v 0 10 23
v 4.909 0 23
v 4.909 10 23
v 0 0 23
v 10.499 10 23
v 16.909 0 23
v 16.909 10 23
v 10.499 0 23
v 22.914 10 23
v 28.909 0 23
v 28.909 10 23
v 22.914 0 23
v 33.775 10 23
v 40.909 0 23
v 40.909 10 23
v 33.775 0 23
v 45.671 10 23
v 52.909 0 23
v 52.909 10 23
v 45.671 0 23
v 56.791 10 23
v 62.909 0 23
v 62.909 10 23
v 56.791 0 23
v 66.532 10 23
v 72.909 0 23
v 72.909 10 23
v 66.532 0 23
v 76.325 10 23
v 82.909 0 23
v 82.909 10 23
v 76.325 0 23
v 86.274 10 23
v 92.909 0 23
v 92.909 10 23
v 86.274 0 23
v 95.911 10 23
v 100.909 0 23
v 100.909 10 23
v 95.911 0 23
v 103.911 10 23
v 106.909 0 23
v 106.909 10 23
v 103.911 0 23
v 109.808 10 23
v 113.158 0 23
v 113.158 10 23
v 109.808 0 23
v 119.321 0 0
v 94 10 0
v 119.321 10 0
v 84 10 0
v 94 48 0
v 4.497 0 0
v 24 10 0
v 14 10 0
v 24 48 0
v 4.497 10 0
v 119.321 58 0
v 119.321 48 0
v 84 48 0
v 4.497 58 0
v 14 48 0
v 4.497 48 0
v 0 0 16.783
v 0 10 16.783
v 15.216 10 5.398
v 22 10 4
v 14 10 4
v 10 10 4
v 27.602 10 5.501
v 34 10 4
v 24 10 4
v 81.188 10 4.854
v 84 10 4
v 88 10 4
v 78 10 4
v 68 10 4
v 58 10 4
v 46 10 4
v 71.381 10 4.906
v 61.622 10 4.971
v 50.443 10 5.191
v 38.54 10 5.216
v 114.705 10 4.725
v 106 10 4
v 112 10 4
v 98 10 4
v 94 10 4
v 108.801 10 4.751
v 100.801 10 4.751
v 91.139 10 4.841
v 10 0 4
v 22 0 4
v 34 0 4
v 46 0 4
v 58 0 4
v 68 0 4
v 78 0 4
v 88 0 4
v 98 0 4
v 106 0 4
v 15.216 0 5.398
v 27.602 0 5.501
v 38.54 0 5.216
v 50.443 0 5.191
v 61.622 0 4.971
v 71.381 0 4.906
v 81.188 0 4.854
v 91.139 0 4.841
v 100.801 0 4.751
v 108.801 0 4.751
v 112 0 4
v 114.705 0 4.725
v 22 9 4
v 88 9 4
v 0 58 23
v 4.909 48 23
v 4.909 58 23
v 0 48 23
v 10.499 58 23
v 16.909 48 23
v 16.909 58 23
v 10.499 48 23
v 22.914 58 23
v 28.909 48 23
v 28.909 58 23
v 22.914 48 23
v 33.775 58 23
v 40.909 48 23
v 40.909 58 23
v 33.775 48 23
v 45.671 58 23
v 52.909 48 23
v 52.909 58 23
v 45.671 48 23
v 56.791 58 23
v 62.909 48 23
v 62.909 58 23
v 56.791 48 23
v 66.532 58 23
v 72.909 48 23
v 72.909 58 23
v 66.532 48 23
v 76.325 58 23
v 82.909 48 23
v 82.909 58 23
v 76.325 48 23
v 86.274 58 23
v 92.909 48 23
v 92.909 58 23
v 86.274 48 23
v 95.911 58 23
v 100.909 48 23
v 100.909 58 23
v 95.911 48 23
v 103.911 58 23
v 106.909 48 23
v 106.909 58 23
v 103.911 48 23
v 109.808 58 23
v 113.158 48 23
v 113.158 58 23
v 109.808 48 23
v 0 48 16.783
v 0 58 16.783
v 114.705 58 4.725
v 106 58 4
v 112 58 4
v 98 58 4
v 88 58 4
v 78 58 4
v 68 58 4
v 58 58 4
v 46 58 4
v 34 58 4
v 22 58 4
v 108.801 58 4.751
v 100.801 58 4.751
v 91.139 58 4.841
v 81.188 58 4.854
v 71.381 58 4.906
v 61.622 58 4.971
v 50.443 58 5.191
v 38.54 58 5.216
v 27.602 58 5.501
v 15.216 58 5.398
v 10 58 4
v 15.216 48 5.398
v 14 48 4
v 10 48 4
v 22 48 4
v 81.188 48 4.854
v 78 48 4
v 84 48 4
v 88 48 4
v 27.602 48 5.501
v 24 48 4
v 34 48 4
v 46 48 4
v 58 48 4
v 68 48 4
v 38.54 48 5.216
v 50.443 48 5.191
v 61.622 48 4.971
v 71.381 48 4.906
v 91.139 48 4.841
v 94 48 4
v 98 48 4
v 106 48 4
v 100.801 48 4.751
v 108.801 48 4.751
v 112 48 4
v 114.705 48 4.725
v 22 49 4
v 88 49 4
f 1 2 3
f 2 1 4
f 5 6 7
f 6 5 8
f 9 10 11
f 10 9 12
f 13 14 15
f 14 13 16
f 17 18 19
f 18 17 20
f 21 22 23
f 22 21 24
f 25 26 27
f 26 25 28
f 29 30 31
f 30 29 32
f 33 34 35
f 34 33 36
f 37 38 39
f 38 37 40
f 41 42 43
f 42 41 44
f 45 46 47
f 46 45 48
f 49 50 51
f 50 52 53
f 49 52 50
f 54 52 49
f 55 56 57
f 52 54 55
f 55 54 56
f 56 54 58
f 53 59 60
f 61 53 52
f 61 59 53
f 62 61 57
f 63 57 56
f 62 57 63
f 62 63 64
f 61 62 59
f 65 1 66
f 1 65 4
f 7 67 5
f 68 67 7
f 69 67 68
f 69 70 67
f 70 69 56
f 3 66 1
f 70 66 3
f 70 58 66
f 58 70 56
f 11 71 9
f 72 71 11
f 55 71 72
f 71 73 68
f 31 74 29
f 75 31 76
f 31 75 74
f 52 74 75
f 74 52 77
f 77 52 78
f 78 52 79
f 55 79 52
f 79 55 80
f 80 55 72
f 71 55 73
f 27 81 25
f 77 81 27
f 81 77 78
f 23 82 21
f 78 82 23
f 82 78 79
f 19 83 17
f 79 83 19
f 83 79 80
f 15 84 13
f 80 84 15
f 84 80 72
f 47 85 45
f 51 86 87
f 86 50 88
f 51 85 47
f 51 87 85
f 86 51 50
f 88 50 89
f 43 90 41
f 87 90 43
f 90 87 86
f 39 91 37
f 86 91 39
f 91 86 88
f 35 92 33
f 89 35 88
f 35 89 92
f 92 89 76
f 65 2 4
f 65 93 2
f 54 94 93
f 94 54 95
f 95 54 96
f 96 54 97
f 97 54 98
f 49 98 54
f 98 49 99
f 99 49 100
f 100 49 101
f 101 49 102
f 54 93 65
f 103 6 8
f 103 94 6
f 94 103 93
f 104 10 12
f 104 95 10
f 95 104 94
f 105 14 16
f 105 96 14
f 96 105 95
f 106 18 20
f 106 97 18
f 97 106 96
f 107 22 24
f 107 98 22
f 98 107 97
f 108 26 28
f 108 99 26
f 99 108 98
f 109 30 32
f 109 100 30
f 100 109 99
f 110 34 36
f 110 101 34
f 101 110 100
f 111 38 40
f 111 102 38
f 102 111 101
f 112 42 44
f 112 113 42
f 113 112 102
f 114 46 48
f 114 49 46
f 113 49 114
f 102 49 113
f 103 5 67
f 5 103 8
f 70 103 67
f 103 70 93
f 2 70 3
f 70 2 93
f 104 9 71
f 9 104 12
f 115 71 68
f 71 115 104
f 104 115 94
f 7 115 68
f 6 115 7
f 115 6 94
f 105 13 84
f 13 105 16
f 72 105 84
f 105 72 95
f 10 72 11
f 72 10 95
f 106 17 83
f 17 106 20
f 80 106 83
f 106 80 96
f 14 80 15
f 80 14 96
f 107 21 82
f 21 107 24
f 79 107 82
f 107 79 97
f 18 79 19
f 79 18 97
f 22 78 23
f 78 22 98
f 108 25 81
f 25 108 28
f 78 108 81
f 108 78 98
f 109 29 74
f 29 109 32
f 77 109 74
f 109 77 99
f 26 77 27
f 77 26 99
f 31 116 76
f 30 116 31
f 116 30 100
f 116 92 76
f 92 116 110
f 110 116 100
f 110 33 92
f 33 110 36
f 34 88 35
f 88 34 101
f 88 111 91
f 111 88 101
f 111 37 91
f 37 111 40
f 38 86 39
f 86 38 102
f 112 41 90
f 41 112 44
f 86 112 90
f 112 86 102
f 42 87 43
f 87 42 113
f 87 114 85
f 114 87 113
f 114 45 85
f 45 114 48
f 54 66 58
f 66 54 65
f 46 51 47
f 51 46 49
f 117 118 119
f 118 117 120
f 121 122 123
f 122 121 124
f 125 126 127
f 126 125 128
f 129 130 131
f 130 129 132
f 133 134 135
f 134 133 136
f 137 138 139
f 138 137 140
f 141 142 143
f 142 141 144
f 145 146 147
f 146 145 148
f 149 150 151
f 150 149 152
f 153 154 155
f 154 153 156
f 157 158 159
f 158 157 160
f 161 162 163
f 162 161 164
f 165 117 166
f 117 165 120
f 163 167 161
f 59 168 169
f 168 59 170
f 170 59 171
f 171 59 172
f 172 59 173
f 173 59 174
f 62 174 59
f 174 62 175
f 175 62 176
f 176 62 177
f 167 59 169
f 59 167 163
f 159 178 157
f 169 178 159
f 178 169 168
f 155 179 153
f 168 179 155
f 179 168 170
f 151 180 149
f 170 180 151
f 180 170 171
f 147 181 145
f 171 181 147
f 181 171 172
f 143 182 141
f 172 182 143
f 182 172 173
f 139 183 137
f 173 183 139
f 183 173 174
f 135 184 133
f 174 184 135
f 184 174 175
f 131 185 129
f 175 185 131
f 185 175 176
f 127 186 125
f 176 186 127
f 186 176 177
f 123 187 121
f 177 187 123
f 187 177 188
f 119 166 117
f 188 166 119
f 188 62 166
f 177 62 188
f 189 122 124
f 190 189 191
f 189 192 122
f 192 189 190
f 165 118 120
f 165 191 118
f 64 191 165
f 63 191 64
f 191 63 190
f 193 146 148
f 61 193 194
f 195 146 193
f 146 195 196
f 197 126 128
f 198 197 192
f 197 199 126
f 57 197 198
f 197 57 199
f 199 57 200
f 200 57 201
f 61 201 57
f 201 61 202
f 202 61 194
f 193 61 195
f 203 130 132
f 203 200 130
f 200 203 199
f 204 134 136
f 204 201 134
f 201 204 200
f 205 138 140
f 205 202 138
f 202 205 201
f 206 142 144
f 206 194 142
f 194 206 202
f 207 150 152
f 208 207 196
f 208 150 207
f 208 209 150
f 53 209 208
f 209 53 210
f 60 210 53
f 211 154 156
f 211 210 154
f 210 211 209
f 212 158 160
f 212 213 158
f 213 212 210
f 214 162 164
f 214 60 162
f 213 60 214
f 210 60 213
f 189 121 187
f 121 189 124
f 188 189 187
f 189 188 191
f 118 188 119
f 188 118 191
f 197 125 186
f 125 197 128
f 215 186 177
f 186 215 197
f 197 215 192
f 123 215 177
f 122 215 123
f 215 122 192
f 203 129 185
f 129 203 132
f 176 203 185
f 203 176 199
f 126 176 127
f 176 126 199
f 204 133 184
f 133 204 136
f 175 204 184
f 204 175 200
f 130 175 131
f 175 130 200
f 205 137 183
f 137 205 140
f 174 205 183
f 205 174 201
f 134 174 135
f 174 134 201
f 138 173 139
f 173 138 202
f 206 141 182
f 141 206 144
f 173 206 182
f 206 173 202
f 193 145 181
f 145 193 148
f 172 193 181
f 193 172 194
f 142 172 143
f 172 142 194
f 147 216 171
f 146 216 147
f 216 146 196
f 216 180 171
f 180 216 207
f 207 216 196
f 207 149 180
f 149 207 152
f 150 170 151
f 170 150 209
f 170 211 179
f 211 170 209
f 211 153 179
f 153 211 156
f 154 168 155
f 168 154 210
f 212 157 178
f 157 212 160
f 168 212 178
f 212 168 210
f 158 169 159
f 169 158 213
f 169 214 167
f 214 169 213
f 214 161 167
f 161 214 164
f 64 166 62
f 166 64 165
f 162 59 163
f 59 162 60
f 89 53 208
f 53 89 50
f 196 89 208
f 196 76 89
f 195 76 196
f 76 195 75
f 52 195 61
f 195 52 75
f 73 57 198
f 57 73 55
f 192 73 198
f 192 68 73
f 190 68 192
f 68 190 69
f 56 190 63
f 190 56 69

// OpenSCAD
module wrench_org_in_longs(){
	difference()
	{
		cube([107,10,23]);
		
		translate([10,-1,4]) rotate([0,-15,0]) cube([6.5,12,20]);
		translate([22,-1,4]) rotate([0,-15,0]) cube([6.2,12,20]);
		translate([34,-1,4]) rotate([0,-15,0]) cube([5.2,12,20]);
		translate([46,-1,4]) rotate([0,-15,0]) cube([5.2,12,20]);
		translate([58,-1,4]) rotate([0,-15,0]) cube([5.1,12,20]);
		translate([68,-1,4]) rotate([0,-15,0]) cube([4.2,12,20]);
		translate([78,-1,4]) rotate([0,-15,0]) cube([3.2,12,20]);
		translate([88,-1,4]) rotate([0,-15,0]) cube([2.95,12,20]);
		translate([98,-1,4]) rotate([0,-15,0]) cube([2.75,12,20]);
		
		translate([2,-1,-10]) rotate([0,-15,0]) cube([5,12,50]);
		translate([110,-1,-10]) rotate([0,-15,0]) cube([7,12,50]);
	}
}

module wrench_org_in_shorts(){
	difference()
	{
		cube([88,10,23]);
		
		translate([10,-1,4]) rotate([0,-15,0]) cube([6.6,12,20]);
		translate([22,-1,4]) rotate([0,-15,0]) cube([5.1,12,20]);
		translate([34,-1,4]) rotate([0,-15,0]) cube([5.1,12,20]);
		translate([46,-1,4]) rotate([0,-15,0]) cube([5.4,12,20]);
		translate([58,-1,4]) rotate([0,-15,0]) cube([4.3,12,20]);
		translate([68,-1,4]) rotate([0,-15,0]) cube([3.8,12,20]);
		translate([78,-1,4]) rotate([0,-15,0]) cube([3,12,20]);


		translate([2,-1,-10]) rotate([0,-15,0]) cube([5,12,50]);
		translate([90,-1,-10]) rotate([0,-15,0]) cube([7,12,50]);
	}
}

module wrench_org_mm_longs(){
	difference()
	{
		cube([120,10,23]);
		
		translate([10,-1,4]) rotate([0,-15,0]) cube([5.4,12,20]);
		translate([22,-1,4]) rotate([0,-15,0]) cube([5.8,12,20]);
		translate([34,-1,4]) rotate([0,-15,0]) cube([4.7,12,20]);
		translate([46,-1,4]) rotate([0,-15,0]) cube([4.6,12,20]);
		translate([58,-1,4]) rotate([0,-15,0]) cube([3.75,12,20]);
		translate([68,-1,4]) rotate([0,-15,0]) cube([3.5,12,20]);
		translate([78,-1,4]) rotate([0,-15,0]) cube([3.3,12,20]);
		translate([88,-1,4]) rotate([0,-15,0]) cube([3.25,12,20]);
		translate([98,-1,4]) rotate([0,-15,0]) cube([2.9,12,20]);
		translate([106,-1,4]) rotate([0,-15,0]) cube([2.9,12,20]);
		translate([112,-1,4]) rotate([0,-15,0]) cube([2.8,12,20]);

		translate([2,-1,-10]) rotate([0,-15,0]) cube([5,12,50]);
		translate([122,-1,-10]) rotate([0,-15,0]) cube([7,12,50]);
	}
}

module wrench_org_mm_shorts(){
	difference()
	{
		cube([88,10,23]);
		
		translate([10,-1,4]) rotate([0,-15,0]) cube([5.1,12,20]);
		translate([22,-1,4]) rotate([0,-15,0]) cube([4.5,12,20]);
		translate([34,-1,4]) rotate([0,-15,0]) cube([4.5,12,20]);
		translate([46,-1,4]) rotate([0,-15,0]) cube([4.4,12,20]);
		translate([58,-1,4]) rotate([0,-15,0]) cube([4.25,12,20]);
		translate([68,-1,4]) rotate([0,-15,0]) cube([3.7,12,20]);
		translate([78,-1,4]) rotate([0,-15,0]) cube([3.7,12,20]);


		translate([2,-1,-10]) rotate([0,-15,0]) cube([5,12,50]);
		translate([90,-1,-10]) rotate([0,-15,0]) cube([7,12,50]);
	}
}
//wrench_org_in_shorts();
//translate([64,9,0]) cube([10,20,4]);
//translate([14,9,0]) cube([10,20,4]);
//translate([0,28,0]) wrench_org_in_shorts();

//wrench_org_in_longs();
//translate([84,9,0]) cube([10,40,4]);
//translate([14,9,0]) cube([10,40,4]);
//translate([0,48,0]) wrench_org_in_longs();

//wrench_org_mm_shorts();
//translate([64,9,0]) cube([10,20,4]);
//translate([14,9,0]) cube([10,20,4]);
//translate([0,28,0]) wrench_org_mm_shorts();

wrench_org_mm_longs();
translate([84,9,0]) cube([10,40,4]);
translate([14,9,0]) cube([10,40,4]);
translate([0,48,0]) wrench_org_mm_longs();
